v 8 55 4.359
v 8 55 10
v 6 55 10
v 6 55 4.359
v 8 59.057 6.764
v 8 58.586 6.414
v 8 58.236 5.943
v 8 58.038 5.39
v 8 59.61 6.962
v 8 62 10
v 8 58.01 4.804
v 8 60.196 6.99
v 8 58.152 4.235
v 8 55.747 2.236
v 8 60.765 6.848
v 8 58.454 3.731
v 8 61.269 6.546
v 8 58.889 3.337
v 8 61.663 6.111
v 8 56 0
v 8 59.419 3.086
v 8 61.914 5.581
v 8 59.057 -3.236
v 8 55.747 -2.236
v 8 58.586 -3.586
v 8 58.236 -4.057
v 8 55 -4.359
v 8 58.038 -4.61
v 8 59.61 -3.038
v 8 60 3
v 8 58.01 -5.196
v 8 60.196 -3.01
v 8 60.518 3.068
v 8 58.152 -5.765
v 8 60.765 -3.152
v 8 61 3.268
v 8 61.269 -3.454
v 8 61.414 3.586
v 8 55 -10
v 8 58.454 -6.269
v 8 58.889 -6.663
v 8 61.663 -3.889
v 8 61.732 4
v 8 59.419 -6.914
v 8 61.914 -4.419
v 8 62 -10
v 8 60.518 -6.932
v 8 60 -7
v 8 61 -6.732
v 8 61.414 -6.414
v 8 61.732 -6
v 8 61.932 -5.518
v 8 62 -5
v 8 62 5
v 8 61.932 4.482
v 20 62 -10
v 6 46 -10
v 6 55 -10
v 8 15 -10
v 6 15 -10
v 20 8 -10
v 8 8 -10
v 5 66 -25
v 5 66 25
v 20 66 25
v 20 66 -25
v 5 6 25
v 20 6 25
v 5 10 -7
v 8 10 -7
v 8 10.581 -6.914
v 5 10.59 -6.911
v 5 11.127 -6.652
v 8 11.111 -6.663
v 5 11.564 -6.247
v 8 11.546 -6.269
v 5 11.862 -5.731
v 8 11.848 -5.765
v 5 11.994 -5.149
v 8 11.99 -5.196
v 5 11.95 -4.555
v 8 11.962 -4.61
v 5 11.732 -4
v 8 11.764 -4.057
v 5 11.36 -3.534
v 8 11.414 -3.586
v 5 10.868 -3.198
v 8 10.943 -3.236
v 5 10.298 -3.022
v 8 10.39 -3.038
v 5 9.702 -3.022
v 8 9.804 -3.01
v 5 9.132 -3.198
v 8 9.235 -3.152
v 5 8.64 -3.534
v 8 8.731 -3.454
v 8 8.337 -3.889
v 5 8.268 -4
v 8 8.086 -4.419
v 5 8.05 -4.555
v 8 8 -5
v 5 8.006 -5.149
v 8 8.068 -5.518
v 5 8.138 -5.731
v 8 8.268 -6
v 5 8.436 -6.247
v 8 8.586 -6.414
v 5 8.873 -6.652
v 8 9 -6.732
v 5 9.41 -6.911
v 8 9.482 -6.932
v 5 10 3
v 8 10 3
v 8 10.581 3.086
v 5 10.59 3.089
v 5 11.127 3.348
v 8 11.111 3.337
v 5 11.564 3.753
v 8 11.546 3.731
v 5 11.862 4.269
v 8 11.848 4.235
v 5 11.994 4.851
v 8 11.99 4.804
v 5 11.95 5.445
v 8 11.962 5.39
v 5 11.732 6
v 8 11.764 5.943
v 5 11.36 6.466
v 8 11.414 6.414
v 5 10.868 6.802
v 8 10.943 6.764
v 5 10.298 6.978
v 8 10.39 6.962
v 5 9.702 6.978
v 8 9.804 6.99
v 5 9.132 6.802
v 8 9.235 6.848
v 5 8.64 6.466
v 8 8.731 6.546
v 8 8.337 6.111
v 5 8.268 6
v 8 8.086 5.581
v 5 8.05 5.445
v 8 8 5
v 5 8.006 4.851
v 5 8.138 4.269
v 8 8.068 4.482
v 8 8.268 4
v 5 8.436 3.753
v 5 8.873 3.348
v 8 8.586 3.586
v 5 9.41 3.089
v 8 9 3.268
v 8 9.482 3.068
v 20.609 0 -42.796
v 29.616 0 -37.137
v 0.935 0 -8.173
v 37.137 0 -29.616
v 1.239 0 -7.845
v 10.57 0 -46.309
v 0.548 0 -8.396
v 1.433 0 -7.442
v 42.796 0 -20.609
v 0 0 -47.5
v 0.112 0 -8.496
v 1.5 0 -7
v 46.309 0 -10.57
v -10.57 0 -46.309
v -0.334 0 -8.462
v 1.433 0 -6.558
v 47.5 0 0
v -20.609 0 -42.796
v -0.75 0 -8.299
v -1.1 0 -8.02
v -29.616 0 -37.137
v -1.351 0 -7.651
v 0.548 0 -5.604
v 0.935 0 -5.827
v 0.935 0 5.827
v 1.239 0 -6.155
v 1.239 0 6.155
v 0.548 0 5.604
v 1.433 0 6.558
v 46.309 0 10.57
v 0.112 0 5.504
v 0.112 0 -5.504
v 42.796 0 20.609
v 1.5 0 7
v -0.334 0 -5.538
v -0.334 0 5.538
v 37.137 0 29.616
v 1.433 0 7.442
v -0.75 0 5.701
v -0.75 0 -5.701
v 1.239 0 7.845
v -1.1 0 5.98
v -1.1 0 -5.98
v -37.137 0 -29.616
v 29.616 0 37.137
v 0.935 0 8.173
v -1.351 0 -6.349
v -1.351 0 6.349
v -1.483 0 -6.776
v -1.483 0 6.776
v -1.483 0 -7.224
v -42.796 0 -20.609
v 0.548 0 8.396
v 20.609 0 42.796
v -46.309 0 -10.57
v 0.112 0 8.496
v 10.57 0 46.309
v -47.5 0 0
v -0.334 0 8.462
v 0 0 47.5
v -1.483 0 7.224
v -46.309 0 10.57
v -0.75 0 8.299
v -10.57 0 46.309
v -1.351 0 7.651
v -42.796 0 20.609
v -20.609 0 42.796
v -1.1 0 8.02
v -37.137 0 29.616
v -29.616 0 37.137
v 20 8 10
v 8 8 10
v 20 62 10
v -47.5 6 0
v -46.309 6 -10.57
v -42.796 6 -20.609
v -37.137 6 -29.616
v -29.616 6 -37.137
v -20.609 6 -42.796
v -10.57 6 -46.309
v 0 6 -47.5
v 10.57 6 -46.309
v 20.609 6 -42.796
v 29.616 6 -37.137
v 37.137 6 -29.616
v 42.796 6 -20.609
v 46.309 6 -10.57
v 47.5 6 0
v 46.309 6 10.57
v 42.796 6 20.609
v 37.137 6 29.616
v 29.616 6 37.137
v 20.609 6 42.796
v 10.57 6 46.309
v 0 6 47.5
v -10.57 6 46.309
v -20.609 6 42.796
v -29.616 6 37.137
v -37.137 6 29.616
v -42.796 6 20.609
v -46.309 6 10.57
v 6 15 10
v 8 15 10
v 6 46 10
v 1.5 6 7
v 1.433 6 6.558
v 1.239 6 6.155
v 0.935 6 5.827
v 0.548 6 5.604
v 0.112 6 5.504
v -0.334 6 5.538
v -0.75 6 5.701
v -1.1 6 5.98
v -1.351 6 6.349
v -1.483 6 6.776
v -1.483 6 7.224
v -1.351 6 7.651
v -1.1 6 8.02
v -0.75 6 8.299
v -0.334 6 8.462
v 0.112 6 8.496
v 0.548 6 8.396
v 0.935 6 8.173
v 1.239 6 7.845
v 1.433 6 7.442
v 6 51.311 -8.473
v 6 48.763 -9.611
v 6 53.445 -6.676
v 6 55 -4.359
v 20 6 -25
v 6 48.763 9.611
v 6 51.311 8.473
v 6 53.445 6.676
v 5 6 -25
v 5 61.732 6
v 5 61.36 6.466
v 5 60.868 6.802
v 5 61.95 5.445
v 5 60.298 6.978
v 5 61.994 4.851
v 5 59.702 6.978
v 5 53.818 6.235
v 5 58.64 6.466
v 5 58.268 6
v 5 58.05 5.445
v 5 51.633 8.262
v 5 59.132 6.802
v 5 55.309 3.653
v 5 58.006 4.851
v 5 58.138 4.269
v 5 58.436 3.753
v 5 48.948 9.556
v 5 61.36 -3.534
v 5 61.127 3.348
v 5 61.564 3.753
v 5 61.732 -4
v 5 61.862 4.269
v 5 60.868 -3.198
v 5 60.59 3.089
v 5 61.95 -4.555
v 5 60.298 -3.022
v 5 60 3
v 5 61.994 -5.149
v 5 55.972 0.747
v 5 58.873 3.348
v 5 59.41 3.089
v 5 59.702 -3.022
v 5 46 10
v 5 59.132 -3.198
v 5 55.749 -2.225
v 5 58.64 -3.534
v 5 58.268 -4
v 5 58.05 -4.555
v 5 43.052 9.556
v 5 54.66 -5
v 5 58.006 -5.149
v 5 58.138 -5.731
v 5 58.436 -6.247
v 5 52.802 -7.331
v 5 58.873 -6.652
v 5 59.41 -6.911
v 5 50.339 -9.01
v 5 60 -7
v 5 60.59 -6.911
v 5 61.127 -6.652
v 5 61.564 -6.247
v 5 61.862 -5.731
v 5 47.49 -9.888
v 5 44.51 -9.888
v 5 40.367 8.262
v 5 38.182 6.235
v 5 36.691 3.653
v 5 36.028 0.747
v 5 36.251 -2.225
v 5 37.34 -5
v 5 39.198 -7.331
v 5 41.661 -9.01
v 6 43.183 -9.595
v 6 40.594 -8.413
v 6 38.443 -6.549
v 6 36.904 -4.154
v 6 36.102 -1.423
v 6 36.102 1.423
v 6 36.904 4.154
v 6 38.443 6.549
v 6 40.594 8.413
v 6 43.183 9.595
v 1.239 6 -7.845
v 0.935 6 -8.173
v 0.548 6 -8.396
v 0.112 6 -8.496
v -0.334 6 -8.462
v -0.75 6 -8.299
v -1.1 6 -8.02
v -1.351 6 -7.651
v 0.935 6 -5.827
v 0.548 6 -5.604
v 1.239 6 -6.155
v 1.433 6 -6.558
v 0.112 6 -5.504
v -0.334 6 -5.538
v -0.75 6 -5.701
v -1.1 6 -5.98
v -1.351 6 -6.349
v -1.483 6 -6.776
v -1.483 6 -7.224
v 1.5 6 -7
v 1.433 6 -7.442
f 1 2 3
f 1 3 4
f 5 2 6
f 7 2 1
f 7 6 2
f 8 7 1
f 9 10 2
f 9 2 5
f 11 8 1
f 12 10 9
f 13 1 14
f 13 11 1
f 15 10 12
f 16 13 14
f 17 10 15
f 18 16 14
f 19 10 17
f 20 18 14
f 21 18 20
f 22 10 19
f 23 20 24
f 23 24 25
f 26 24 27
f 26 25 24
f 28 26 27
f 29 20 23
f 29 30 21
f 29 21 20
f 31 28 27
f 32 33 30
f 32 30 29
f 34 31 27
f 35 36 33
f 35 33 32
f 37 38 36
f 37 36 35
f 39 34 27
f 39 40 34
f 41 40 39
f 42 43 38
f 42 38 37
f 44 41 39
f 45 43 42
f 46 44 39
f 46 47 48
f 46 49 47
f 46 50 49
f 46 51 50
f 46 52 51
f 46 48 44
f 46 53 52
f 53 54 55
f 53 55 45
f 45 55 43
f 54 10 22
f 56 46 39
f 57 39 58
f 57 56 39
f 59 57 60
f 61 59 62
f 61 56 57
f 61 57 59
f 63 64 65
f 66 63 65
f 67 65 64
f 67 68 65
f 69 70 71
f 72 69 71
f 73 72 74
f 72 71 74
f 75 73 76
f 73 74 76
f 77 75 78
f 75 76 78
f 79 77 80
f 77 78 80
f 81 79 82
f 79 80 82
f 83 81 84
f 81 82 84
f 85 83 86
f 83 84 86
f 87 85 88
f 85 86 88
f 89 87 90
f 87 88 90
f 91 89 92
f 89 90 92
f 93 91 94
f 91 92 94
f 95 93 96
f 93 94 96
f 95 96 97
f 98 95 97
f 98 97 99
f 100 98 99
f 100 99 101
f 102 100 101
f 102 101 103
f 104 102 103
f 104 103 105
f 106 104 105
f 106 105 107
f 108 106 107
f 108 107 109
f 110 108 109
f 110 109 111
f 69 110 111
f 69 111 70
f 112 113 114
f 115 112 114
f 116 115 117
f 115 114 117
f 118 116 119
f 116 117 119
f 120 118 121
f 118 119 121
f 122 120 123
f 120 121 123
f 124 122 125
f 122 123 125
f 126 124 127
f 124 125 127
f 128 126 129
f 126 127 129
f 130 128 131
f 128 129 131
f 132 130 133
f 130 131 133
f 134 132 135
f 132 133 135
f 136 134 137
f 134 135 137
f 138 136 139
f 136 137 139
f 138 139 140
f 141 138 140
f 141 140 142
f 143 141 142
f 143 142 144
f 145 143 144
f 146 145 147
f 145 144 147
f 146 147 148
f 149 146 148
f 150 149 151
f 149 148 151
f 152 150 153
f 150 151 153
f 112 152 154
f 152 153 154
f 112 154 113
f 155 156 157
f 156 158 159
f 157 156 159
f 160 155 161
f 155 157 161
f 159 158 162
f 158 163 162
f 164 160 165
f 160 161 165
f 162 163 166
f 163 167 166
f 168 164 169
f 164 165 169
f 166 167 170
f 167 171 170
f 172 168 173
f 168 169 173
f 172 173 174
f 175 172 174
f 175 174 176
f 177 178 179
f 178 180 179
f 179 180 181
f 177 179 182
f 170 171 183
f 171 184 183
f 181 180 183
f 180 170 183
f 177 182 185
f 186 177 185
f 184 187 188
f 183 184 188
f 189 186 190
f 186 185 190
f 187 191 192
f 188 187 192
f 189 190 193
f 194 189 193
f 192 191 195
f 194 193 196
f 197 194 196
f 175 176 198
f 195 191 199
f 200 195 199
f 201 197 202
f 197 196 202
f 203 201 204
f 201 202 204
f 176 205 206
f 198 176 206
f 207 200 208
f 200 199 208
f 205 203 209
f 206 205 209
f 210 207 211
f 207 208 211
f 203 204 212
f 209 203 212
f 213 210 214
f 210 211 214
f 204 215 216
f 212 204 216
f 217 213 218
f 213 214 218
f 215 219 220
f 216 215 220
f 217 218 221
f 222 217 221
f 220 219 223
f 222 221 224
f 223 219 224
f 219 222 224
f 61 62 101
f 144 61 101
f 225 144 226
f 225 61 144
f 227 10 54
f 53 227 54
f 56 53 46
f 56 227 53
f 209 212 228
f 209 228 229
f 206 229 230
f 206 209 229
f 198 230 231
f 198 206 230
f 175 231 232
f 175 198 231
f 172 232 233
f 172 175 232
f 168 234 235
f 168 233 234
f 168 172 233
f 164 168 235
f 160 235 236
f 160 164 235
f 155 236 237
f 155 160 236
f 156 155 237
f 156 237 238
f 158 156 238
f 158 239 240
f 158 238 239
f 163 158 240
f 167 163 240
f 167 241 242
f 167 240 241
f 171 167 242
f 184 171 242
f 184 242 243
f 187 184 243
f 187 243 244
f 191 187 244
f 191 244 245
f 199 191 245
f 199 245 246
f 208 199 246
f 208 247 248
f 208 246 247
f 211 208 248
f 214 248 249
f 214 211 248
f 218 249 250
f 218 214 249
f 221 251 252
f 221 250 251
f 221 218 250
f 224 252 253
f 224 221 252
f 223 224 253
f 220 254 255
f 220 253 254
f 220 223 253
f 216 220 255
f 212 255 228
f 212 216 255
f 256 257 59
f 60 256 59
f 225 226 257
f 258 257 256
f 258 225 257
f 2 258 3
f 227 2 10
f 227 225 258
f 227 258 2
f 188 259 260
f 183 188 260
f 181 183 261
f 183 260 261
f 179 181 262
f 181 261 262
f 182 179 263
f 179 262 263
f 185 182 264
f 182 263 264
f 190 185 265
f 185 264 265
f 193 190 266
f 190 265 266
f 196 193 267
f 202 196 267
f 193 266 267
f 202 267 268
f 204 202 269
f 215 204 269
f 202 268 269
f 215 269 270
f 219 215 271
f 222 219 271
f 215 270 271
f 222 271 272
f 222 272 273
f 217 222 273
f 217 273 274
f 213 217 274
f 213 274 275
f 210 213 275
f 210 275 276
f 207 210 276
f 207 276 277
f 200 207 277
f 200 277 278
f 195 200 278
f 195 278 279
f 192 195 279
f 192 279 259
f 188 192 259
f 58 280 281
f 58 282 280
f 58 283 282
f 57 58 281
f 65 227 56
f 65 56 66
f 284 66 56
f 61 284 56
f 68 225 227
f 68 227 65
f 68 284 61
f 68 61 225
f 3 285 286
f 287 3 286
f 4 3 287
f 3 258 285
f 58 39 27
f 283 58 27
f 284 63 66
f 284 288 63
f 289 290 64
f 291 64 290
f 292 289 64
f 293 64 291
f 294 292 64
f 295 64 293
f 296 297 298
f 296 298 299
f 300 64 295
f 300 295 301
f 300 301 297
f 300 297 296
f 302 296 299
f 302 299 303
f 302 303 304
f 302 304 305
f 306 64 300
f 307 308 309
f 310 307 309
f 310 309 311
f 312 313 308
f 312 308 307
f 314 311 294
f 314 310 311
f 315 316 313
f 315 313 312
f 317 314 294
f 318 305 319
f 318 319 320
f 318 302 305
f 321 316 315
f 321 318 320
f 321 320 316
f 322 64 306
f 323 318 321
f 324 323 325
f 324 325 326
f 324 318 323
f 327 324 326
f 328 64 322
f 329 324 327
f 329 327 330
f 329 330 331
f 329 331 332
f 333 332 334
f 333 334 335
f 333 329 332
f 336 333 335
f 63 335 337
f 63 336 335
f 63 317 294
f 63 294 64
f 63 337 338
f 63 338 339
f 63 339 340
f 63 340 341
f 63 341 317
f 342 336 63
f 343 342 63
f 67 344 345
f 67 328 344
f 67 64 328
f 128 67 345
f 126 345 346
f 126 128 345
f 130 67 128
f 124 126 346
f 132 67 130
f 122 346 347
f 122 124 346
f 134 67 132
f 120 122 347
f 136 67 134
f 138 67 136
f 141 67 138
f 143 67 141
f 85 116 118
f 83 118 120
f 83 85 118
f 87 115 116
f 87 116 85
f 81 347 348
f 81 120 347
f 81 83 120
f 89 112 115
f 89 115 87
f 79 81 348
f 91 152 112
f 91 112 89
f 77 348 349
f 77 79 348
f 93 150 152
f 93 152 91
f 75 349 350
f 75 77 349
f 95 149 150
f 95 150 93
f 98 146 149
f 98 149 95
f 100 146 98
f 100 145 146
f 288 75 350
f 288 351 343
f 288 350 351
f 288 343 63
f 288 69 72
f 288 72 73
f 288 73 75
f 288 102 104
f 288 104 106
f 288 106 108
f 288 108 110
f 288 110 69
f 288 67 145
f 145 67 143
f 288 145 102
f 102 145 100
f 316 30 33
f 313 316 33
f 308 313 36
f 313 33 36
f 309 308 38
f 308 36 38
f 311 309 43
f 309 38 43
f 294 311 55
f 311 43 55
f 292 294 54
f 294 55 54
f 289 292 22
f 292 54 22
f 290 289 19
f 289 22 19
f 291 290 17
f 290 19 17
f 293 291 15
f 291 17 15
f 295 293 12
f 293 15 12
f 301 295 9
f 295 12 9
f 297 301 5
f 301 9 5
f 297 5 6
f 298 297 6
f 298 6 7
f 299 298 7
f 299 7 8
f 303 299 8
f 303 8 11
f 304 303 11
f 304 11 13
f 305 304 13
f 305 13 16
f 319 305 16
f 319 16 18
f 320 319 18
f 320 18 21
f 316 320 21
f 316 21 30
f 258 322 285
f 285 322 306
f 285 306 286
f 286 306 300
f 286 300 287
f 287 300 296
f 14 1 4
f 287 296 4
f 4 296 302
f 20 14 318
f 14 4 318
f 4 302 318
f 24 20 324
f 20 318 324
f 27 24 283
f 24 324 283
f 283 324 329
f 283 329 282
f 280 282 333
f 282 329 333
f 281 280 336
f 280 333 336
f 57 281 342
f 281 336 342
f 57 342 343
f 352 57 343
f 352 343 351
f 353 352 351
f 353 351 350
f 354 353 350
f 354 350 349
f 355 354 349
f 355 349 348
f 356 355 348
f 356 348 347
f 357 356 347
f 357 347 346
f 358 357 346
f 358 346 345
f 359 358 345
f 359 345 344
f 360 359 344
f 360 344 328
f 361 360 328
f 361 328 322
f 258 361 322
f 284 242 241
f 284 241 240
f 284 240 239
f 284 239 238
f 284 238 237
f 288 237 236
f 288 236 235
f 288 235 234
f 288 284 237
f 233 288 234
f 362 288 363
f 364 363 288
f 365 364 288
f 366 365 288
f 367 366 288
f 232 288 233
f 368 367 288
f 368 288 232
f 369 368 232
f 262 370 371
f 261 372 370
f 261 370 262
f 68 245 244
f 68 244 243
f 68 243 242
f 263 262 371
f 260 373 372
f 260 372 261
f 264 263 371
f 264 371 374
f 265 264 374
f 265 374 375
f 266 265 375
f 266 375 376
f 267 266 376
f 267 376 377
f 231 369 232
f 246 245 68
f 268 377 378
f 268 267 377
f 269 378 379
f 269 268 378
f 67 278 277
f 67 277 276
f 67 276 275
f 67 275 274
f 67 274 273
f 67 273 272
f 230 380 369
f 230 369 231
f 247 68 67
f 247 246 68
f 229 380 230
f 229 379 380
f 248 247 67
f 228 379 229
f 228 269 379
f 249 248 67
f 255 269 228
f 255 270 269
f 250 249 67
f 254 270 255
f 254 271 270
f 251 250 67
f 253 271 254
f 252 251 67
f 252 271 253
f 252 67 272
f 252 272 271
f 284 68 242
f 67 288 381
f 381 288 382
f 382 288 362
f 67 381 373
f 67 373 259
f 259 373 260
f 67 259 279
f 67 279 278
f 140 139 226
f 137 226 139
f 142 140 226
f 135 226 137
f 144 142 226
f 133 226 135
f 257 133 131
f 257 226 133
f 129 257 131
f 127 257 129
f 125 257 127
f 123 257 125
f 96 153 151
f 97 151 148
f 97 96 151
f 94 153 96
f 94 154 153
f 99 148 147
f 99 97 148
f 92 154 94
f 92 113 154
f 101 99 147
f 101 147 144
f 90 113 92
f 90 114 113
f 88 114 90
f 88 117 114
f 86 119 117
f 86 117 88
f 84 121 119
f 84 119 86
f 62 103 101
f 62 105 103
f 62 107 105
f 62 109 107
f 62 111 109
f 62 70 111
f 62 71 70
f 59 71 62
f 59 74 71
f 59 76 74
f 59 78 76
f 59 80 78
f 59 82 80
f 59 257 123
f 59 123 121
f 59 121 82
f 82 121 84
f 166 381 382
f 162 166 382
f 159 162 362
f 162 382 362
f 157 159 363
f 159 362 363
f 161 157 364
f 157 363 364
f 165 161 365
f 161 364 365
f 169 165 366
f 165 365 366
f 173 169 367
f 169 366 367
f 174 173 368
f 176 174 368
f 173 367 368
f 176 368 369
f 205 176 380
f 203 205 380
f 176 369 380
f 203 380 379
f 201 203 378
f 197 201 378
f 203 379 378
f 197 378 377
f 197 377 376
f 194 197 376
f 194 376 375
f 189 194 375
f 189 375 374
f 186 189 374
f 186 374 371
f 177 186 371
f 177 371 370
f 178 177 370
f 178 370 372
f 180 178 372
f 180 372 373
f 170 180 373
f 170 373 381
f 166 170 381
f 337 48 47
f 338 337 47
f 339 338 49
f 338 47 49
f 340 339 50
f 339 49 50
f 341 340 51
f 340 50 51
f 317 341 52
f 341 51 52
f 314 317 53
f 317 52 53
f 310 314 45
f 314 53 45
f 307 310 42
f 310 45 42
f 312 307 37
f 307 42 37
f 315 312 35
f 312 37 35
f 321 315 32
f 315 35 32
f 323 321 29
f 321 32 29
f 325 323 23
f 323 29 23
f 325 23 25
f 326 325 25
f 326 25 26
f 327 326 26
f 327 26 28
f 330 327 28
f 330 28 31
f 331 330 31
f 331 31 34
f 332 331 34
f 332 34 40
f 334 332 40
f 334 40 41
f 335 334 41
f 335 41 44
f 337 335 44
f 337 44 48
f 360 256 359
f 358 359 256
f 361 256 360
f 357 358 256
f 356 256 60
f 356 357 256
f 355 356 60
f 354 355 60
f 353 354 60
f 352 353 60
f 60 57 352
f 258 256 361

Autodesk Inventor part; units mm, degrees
ref_plane "YZ Plane" through (0, 0, 0) normal (1, 0, 0) x (0, 1, 0)
ref_plane "XZ Plane" through (0, 0, 0) normal (0, 1, 0) x (-1, 0, 0)
ref_plane "XY Plane" through (0, 0, 0) normal (0, 0, 1) x (1, 0, 0)
sketch "Sketch1" plane through (0, 0, 0) normal (0, 1, 0) x (-1, 0, 0)
  circle A0 centre (0, 0) radius 47.5
  dimension "d0" = 95
extrude "Extrusion1" add sketch "Sketch1" along normal blind 6
sketch "Sketch2" plane through (0, 6, 0) normal (0, 1, 0) x (1, 0, 0)
  circle A0 centre (0, 0) radius 7
  circle A1 centre (0, -7) radius 1.5
  circle A2 centre (0, 7) radius 1.5
  dimension "d3" = 14
  dimension "d4" = 3
  dimension "d5" = 3
extrude "Extrusion2" cut sketch "Sketch2" against normal blind 6 contours A2 A0 | A0 A2 | A1 A0 | A0 A1
sketch "Sketch3" plane through (0, 6, 0) normal (0, 1, 0) x (1, 0, 0)
  line L0 (0, 0) -> (5, 0)
  line L1 (5, 0) -> (5, -10)
  line L2 (5, -10) -> (0, -10)
  line L3 (0, -10) -> (0, 0)
  line L4 (5, 0) -> (0, 0)
  line L5 (0, 0) -> (0, 10)
  line L6 (0, 10) -> (5, 10)
  line L7 (5, 10) -> (5, 0)
  line L8 (5, 0) -> (20, 0)
  line L9 (20, 0) -> (20, -25)
  line L10 (20, -25) -> (5, -25)
  line L11 (5, -25) -> (5, 0)
  line L12 (20, 0) -> (5, 0)
  line L13 (5, 0) -> (5, 25)
  line L14 (5, 25) -> (20, 25)
  line L15 (20, 25) -> (20, 0)
  dimension "d8" = 5
  dimension "d9" = 10
  dimension "d10" = 10
  dimension "d11" = 15
  dimension "d12" = 25
  dimension "d13" = 25
extrude "Extrusion3" add sketch "Sketch3" along normal blind 60 contours L8 L9 L10 L11 L1 | L7 L13 L14 L15 L8
sketch "Sketch4" plane through (5, 6, -25) normal (-1, 0, 0) x (0, 0, 1)
  line L0 (50, 0) -> (50, 60) projected
  line L1 (50, 0) -> (48, 0)
  line L2 (48, 0) -> (48, 40)
  line L3 (48, 40) -> (50, 40)
  line L4 (50, 40) -> (50, 0)
  circle A0 centre (25, 40) radius 10
  point P0 (25, -6)
  dimension "d16" = 2
  dimension "d17" = 40
  dimension "d18" = 20
extrude "Extrusion4" cut sketch "Sketch4" against normal blind 20 contours A0
sketch "Sketch5" plane through (20, 6, 25) normal (1, 0, 0) x (0, 0, -1)
  circle A0 centre (25, 40) radius 10 projected
  line L0 (25, 40) -> (30, 40)
  line L1 (30, 40) -> (30, 4)
  line L2 (30, 4) -> (25, 4)
  line L3 (25, 4) -> (25, 40)
  line L4 (25, 40) -> (20, 40)
  line L5 (20, 40) -> (20, 4)
  line L6 (20, 4) -> (25, 4)
  line L7 (25, 4) -> (25, 40)
  circle A1 centre (20, 4) radius 2
  circle A2 centre (30, 4) radius 2
  point P0 (25, -6)
  dimension "d21" = 5
  dimension "d22" = 36
  dimension "d23" = 5
  dimension "d24" = 36
  dimension "d25" = 4
  dimension "d26" = 4
extrude "Extrusion5" cut sketch "Sketch5" against normal blind 20 contours A1 L6 L5 | L5 L6 A1 | A2 L2 L1 | L1 L2 A2
sketch "Sketch6" plane through (20, 6, 25) normal (1, 0, 0) x (0, 0, -1)
  line L0 (25, 40) -> (30, 40)
  line L1 (30, 40) -> (30, 54)
  line L2 (30, 54) -> (25, 54)
  line L3 (25, 54) -> (25, 40)
  line L4 (25, 40) -> (20, 40)
  line L5 (20, 40) -> (20, 54)
  line L6 (20, 54) -> (25, 54)
  line L7 (25, 54) -> (25, 40)
  circle A0 centre (20, 54) radius 2
  circle A1 centre (30, 54) radius 2
  point P0 (25, -6)
  dimension "d29" = 5
  dimension "d30" = 14
  dimension "d31" = 5
  dimension "d32" = 14
  dimension "d33" = 4
  dimension "d34" = 4
extrude "Extrusion6" cut sketch "Sketch6" against normal blind 20 contours A1 L2 L1 | L1 L2 A1 | A0 L5 L6 | L6 L5 A0
sketch "Sketch7" plane through (20, 6, 25) normal (1, 0, 0) x (0, 0, -1)
  line L0 (20, 54) -> (30, 54)
  line L1 (30, 54) -> (30, 4)
  line L2 (30, 4) -> (20, 4)
  line L3 (20, 4) -> (20, 54)
  circle A0 centre (20, 54) radius 2 projected
  line L4 (0, 0) -> (0, 60) projected
  line L5 (20, 54) -> (0, 54)
  line L6 (0, 54) -> (0, 49)
  line L7 (0, 49) -> (20, 49)
  line L8 (20, 49) -> (20, 54)
  circle A1 centre (25, 40) radius 10 projected
  line L9 (25, 40) -> (15, 40)
  line L10 (15, 40) -> (15, 30)
  line L11 (15, 30) -> (25, 30)
  line L12 (25, 30) -> (25, 40)
  line L13 (25, 40) -> (35, 40)
  line L14 (35, 40) -> (35, 30)
  line L15 (35, 30) -> (25, 30)
  line L16 (25, 30) -> (25, 40)
  line L17 (35, 40) -> (15, 40)
  line L18 (15, 40) -> (15, 9)
  line L19 (15, 9) -> (35, 9)
  line L20 (35, 9) -> (35, 40)
  line L21 (15, 9) -> (35, 9)
  line L22 (35, 9) -> (35, 49)
  line L23 (35, 49) -> (15, 49)
  line L24 (15, 49) -> (15, 9)
  point P0 (25, -6)
  point P1 (30, 49)
  point P2 (30, 48.6603)
  point P3 (15, 49)
  point P4 (20, 48.6603)
  dimension "d37" = 10
  dimension "d38" = 50
  dimension "d39" = 5
  dimension "d40" = 10
  dimension "d41" = 10
  dimension "d42" = 10
  dimension "d43" = 31
  dimension "d44" = 40
extrude "Extrusion7" cut sketch "Sketch7" against normal blind 14 contours L3 A1 L24 L7 | L23 L22 A1 L1 | A1 L3 L11 L10 | L14 L15 L1 A1 | A1 L11 L3 | L11 L3 L19 L18 | L1 L15 A1 | L20 L19 L1 L15 | L11 L15 L1 L19 L3
sketch "Sketch8" plane through (20, 6, 25) normal (1, 0, 0) x (0, 0, -1)
  line L0 (15, 40) -> (15, 49) projected
  line L1 (15, 49) -> (35, 49)
  line L2 (35, 49) -> (35, 56)
  line L3 (35, 56) -> (15, 56)
  line L4 (15, 56) -> (15, 49)
  line L5 (35, 9) -> (15, 9) projected
  line L6 (15, 9) -> (35, 9)
  line L7 (35, 9) -> (35, 2)
  line L8 (35, 2) -> (15, 2)
  line L9 (15, 2) -> (15, 9)
  point P0 (25, -6)
  dimension "d47" = 20
  dimension "d48" = 7
  dimension "d49" = 20
  dimension "d50" = 7
sketch "Sketch9" plane through (20, 6, 25) normal (1, 0, 0) x (0, 0, -1)
  line L0 (15, 40) -> (15, 49) projected
  circle A0 centre (25, 40) radius 10 projected
  line L1 (15, 49) -> (35, 49)
  line L2 (35, 49) -> (35, 40)
  line L3 (35, 40) -> (15, 40)
  line L4 (15, 40) -> (15, 49)
  line L5 (15, 49) -> (20, 49) projected
  line L6 (20, 49) -> (20.777, 49)
  line L7 (20.777, 49) -> (20.777, 48.469)
  line L8 (20.777, 48.469) -> (20, 48.469)
  line L9 (20, 48.469) -> (20, 49)
  line L10 (30, 49) -> (35, 49) projected
  line L11 (30, 49) -> (29.2041, 49)
  line L12 (29.2041, 49) -> (29.2041, 48.469)
  line L13 (29.2041, 48.469) -> (30, 48.469)
  line L14 (30, 48.469) -> (30, 49)
  line L15 (35, 49) -> (35, 9) projected
  line L16 (15, 56) -> (35, 56)
  line L17 (35, 56) -> (35, 49)
  line L18 (35, 49) -> (15, 49)
  line L19 (15, 49) -> (15, 56)
  line L20 (15, 9) -> (15, 49) projected
  line L21 (15, 9) -> (35, 9)
  line L22 (35, 9) -> (35, 2)
  line L23 (35, 2) -> (15, 2)
  line L24 (15, 2) -> (15, 9)
  point P0 (25, -6)
  point P1 (20, 48.6603)
  point P2 (30, 48.6603)
  dimension "d51" = 7
extrude "Extrusion8" cut sketch "Sketch9" against normal blind 12 contours L19 L16 L17 L1 A0 | L9 L1 A0 | L21 L22 L23 L24 | A0 L1 L14
sketch "Sketch10" plane through (8, 60, -5) normal (1, 0, 0) x (0, 0, -1)
  line L0 (-10, -5) -> (-10, -5.3397) projected
  line L1 (-10, -5) -> (0, -5)
  line L2 (0, -5) -> (0, -5.5581)
  line L3 (0, -5.5581) -> (-10, -5.5581)
  line L4 (-10, -5.5581) -> (-10, -5)
  point P0 (-5, -60)
extrude "Extrusion9" cut sketch "Sketch10" against normal blind 2
properties part number "BaseTop"
